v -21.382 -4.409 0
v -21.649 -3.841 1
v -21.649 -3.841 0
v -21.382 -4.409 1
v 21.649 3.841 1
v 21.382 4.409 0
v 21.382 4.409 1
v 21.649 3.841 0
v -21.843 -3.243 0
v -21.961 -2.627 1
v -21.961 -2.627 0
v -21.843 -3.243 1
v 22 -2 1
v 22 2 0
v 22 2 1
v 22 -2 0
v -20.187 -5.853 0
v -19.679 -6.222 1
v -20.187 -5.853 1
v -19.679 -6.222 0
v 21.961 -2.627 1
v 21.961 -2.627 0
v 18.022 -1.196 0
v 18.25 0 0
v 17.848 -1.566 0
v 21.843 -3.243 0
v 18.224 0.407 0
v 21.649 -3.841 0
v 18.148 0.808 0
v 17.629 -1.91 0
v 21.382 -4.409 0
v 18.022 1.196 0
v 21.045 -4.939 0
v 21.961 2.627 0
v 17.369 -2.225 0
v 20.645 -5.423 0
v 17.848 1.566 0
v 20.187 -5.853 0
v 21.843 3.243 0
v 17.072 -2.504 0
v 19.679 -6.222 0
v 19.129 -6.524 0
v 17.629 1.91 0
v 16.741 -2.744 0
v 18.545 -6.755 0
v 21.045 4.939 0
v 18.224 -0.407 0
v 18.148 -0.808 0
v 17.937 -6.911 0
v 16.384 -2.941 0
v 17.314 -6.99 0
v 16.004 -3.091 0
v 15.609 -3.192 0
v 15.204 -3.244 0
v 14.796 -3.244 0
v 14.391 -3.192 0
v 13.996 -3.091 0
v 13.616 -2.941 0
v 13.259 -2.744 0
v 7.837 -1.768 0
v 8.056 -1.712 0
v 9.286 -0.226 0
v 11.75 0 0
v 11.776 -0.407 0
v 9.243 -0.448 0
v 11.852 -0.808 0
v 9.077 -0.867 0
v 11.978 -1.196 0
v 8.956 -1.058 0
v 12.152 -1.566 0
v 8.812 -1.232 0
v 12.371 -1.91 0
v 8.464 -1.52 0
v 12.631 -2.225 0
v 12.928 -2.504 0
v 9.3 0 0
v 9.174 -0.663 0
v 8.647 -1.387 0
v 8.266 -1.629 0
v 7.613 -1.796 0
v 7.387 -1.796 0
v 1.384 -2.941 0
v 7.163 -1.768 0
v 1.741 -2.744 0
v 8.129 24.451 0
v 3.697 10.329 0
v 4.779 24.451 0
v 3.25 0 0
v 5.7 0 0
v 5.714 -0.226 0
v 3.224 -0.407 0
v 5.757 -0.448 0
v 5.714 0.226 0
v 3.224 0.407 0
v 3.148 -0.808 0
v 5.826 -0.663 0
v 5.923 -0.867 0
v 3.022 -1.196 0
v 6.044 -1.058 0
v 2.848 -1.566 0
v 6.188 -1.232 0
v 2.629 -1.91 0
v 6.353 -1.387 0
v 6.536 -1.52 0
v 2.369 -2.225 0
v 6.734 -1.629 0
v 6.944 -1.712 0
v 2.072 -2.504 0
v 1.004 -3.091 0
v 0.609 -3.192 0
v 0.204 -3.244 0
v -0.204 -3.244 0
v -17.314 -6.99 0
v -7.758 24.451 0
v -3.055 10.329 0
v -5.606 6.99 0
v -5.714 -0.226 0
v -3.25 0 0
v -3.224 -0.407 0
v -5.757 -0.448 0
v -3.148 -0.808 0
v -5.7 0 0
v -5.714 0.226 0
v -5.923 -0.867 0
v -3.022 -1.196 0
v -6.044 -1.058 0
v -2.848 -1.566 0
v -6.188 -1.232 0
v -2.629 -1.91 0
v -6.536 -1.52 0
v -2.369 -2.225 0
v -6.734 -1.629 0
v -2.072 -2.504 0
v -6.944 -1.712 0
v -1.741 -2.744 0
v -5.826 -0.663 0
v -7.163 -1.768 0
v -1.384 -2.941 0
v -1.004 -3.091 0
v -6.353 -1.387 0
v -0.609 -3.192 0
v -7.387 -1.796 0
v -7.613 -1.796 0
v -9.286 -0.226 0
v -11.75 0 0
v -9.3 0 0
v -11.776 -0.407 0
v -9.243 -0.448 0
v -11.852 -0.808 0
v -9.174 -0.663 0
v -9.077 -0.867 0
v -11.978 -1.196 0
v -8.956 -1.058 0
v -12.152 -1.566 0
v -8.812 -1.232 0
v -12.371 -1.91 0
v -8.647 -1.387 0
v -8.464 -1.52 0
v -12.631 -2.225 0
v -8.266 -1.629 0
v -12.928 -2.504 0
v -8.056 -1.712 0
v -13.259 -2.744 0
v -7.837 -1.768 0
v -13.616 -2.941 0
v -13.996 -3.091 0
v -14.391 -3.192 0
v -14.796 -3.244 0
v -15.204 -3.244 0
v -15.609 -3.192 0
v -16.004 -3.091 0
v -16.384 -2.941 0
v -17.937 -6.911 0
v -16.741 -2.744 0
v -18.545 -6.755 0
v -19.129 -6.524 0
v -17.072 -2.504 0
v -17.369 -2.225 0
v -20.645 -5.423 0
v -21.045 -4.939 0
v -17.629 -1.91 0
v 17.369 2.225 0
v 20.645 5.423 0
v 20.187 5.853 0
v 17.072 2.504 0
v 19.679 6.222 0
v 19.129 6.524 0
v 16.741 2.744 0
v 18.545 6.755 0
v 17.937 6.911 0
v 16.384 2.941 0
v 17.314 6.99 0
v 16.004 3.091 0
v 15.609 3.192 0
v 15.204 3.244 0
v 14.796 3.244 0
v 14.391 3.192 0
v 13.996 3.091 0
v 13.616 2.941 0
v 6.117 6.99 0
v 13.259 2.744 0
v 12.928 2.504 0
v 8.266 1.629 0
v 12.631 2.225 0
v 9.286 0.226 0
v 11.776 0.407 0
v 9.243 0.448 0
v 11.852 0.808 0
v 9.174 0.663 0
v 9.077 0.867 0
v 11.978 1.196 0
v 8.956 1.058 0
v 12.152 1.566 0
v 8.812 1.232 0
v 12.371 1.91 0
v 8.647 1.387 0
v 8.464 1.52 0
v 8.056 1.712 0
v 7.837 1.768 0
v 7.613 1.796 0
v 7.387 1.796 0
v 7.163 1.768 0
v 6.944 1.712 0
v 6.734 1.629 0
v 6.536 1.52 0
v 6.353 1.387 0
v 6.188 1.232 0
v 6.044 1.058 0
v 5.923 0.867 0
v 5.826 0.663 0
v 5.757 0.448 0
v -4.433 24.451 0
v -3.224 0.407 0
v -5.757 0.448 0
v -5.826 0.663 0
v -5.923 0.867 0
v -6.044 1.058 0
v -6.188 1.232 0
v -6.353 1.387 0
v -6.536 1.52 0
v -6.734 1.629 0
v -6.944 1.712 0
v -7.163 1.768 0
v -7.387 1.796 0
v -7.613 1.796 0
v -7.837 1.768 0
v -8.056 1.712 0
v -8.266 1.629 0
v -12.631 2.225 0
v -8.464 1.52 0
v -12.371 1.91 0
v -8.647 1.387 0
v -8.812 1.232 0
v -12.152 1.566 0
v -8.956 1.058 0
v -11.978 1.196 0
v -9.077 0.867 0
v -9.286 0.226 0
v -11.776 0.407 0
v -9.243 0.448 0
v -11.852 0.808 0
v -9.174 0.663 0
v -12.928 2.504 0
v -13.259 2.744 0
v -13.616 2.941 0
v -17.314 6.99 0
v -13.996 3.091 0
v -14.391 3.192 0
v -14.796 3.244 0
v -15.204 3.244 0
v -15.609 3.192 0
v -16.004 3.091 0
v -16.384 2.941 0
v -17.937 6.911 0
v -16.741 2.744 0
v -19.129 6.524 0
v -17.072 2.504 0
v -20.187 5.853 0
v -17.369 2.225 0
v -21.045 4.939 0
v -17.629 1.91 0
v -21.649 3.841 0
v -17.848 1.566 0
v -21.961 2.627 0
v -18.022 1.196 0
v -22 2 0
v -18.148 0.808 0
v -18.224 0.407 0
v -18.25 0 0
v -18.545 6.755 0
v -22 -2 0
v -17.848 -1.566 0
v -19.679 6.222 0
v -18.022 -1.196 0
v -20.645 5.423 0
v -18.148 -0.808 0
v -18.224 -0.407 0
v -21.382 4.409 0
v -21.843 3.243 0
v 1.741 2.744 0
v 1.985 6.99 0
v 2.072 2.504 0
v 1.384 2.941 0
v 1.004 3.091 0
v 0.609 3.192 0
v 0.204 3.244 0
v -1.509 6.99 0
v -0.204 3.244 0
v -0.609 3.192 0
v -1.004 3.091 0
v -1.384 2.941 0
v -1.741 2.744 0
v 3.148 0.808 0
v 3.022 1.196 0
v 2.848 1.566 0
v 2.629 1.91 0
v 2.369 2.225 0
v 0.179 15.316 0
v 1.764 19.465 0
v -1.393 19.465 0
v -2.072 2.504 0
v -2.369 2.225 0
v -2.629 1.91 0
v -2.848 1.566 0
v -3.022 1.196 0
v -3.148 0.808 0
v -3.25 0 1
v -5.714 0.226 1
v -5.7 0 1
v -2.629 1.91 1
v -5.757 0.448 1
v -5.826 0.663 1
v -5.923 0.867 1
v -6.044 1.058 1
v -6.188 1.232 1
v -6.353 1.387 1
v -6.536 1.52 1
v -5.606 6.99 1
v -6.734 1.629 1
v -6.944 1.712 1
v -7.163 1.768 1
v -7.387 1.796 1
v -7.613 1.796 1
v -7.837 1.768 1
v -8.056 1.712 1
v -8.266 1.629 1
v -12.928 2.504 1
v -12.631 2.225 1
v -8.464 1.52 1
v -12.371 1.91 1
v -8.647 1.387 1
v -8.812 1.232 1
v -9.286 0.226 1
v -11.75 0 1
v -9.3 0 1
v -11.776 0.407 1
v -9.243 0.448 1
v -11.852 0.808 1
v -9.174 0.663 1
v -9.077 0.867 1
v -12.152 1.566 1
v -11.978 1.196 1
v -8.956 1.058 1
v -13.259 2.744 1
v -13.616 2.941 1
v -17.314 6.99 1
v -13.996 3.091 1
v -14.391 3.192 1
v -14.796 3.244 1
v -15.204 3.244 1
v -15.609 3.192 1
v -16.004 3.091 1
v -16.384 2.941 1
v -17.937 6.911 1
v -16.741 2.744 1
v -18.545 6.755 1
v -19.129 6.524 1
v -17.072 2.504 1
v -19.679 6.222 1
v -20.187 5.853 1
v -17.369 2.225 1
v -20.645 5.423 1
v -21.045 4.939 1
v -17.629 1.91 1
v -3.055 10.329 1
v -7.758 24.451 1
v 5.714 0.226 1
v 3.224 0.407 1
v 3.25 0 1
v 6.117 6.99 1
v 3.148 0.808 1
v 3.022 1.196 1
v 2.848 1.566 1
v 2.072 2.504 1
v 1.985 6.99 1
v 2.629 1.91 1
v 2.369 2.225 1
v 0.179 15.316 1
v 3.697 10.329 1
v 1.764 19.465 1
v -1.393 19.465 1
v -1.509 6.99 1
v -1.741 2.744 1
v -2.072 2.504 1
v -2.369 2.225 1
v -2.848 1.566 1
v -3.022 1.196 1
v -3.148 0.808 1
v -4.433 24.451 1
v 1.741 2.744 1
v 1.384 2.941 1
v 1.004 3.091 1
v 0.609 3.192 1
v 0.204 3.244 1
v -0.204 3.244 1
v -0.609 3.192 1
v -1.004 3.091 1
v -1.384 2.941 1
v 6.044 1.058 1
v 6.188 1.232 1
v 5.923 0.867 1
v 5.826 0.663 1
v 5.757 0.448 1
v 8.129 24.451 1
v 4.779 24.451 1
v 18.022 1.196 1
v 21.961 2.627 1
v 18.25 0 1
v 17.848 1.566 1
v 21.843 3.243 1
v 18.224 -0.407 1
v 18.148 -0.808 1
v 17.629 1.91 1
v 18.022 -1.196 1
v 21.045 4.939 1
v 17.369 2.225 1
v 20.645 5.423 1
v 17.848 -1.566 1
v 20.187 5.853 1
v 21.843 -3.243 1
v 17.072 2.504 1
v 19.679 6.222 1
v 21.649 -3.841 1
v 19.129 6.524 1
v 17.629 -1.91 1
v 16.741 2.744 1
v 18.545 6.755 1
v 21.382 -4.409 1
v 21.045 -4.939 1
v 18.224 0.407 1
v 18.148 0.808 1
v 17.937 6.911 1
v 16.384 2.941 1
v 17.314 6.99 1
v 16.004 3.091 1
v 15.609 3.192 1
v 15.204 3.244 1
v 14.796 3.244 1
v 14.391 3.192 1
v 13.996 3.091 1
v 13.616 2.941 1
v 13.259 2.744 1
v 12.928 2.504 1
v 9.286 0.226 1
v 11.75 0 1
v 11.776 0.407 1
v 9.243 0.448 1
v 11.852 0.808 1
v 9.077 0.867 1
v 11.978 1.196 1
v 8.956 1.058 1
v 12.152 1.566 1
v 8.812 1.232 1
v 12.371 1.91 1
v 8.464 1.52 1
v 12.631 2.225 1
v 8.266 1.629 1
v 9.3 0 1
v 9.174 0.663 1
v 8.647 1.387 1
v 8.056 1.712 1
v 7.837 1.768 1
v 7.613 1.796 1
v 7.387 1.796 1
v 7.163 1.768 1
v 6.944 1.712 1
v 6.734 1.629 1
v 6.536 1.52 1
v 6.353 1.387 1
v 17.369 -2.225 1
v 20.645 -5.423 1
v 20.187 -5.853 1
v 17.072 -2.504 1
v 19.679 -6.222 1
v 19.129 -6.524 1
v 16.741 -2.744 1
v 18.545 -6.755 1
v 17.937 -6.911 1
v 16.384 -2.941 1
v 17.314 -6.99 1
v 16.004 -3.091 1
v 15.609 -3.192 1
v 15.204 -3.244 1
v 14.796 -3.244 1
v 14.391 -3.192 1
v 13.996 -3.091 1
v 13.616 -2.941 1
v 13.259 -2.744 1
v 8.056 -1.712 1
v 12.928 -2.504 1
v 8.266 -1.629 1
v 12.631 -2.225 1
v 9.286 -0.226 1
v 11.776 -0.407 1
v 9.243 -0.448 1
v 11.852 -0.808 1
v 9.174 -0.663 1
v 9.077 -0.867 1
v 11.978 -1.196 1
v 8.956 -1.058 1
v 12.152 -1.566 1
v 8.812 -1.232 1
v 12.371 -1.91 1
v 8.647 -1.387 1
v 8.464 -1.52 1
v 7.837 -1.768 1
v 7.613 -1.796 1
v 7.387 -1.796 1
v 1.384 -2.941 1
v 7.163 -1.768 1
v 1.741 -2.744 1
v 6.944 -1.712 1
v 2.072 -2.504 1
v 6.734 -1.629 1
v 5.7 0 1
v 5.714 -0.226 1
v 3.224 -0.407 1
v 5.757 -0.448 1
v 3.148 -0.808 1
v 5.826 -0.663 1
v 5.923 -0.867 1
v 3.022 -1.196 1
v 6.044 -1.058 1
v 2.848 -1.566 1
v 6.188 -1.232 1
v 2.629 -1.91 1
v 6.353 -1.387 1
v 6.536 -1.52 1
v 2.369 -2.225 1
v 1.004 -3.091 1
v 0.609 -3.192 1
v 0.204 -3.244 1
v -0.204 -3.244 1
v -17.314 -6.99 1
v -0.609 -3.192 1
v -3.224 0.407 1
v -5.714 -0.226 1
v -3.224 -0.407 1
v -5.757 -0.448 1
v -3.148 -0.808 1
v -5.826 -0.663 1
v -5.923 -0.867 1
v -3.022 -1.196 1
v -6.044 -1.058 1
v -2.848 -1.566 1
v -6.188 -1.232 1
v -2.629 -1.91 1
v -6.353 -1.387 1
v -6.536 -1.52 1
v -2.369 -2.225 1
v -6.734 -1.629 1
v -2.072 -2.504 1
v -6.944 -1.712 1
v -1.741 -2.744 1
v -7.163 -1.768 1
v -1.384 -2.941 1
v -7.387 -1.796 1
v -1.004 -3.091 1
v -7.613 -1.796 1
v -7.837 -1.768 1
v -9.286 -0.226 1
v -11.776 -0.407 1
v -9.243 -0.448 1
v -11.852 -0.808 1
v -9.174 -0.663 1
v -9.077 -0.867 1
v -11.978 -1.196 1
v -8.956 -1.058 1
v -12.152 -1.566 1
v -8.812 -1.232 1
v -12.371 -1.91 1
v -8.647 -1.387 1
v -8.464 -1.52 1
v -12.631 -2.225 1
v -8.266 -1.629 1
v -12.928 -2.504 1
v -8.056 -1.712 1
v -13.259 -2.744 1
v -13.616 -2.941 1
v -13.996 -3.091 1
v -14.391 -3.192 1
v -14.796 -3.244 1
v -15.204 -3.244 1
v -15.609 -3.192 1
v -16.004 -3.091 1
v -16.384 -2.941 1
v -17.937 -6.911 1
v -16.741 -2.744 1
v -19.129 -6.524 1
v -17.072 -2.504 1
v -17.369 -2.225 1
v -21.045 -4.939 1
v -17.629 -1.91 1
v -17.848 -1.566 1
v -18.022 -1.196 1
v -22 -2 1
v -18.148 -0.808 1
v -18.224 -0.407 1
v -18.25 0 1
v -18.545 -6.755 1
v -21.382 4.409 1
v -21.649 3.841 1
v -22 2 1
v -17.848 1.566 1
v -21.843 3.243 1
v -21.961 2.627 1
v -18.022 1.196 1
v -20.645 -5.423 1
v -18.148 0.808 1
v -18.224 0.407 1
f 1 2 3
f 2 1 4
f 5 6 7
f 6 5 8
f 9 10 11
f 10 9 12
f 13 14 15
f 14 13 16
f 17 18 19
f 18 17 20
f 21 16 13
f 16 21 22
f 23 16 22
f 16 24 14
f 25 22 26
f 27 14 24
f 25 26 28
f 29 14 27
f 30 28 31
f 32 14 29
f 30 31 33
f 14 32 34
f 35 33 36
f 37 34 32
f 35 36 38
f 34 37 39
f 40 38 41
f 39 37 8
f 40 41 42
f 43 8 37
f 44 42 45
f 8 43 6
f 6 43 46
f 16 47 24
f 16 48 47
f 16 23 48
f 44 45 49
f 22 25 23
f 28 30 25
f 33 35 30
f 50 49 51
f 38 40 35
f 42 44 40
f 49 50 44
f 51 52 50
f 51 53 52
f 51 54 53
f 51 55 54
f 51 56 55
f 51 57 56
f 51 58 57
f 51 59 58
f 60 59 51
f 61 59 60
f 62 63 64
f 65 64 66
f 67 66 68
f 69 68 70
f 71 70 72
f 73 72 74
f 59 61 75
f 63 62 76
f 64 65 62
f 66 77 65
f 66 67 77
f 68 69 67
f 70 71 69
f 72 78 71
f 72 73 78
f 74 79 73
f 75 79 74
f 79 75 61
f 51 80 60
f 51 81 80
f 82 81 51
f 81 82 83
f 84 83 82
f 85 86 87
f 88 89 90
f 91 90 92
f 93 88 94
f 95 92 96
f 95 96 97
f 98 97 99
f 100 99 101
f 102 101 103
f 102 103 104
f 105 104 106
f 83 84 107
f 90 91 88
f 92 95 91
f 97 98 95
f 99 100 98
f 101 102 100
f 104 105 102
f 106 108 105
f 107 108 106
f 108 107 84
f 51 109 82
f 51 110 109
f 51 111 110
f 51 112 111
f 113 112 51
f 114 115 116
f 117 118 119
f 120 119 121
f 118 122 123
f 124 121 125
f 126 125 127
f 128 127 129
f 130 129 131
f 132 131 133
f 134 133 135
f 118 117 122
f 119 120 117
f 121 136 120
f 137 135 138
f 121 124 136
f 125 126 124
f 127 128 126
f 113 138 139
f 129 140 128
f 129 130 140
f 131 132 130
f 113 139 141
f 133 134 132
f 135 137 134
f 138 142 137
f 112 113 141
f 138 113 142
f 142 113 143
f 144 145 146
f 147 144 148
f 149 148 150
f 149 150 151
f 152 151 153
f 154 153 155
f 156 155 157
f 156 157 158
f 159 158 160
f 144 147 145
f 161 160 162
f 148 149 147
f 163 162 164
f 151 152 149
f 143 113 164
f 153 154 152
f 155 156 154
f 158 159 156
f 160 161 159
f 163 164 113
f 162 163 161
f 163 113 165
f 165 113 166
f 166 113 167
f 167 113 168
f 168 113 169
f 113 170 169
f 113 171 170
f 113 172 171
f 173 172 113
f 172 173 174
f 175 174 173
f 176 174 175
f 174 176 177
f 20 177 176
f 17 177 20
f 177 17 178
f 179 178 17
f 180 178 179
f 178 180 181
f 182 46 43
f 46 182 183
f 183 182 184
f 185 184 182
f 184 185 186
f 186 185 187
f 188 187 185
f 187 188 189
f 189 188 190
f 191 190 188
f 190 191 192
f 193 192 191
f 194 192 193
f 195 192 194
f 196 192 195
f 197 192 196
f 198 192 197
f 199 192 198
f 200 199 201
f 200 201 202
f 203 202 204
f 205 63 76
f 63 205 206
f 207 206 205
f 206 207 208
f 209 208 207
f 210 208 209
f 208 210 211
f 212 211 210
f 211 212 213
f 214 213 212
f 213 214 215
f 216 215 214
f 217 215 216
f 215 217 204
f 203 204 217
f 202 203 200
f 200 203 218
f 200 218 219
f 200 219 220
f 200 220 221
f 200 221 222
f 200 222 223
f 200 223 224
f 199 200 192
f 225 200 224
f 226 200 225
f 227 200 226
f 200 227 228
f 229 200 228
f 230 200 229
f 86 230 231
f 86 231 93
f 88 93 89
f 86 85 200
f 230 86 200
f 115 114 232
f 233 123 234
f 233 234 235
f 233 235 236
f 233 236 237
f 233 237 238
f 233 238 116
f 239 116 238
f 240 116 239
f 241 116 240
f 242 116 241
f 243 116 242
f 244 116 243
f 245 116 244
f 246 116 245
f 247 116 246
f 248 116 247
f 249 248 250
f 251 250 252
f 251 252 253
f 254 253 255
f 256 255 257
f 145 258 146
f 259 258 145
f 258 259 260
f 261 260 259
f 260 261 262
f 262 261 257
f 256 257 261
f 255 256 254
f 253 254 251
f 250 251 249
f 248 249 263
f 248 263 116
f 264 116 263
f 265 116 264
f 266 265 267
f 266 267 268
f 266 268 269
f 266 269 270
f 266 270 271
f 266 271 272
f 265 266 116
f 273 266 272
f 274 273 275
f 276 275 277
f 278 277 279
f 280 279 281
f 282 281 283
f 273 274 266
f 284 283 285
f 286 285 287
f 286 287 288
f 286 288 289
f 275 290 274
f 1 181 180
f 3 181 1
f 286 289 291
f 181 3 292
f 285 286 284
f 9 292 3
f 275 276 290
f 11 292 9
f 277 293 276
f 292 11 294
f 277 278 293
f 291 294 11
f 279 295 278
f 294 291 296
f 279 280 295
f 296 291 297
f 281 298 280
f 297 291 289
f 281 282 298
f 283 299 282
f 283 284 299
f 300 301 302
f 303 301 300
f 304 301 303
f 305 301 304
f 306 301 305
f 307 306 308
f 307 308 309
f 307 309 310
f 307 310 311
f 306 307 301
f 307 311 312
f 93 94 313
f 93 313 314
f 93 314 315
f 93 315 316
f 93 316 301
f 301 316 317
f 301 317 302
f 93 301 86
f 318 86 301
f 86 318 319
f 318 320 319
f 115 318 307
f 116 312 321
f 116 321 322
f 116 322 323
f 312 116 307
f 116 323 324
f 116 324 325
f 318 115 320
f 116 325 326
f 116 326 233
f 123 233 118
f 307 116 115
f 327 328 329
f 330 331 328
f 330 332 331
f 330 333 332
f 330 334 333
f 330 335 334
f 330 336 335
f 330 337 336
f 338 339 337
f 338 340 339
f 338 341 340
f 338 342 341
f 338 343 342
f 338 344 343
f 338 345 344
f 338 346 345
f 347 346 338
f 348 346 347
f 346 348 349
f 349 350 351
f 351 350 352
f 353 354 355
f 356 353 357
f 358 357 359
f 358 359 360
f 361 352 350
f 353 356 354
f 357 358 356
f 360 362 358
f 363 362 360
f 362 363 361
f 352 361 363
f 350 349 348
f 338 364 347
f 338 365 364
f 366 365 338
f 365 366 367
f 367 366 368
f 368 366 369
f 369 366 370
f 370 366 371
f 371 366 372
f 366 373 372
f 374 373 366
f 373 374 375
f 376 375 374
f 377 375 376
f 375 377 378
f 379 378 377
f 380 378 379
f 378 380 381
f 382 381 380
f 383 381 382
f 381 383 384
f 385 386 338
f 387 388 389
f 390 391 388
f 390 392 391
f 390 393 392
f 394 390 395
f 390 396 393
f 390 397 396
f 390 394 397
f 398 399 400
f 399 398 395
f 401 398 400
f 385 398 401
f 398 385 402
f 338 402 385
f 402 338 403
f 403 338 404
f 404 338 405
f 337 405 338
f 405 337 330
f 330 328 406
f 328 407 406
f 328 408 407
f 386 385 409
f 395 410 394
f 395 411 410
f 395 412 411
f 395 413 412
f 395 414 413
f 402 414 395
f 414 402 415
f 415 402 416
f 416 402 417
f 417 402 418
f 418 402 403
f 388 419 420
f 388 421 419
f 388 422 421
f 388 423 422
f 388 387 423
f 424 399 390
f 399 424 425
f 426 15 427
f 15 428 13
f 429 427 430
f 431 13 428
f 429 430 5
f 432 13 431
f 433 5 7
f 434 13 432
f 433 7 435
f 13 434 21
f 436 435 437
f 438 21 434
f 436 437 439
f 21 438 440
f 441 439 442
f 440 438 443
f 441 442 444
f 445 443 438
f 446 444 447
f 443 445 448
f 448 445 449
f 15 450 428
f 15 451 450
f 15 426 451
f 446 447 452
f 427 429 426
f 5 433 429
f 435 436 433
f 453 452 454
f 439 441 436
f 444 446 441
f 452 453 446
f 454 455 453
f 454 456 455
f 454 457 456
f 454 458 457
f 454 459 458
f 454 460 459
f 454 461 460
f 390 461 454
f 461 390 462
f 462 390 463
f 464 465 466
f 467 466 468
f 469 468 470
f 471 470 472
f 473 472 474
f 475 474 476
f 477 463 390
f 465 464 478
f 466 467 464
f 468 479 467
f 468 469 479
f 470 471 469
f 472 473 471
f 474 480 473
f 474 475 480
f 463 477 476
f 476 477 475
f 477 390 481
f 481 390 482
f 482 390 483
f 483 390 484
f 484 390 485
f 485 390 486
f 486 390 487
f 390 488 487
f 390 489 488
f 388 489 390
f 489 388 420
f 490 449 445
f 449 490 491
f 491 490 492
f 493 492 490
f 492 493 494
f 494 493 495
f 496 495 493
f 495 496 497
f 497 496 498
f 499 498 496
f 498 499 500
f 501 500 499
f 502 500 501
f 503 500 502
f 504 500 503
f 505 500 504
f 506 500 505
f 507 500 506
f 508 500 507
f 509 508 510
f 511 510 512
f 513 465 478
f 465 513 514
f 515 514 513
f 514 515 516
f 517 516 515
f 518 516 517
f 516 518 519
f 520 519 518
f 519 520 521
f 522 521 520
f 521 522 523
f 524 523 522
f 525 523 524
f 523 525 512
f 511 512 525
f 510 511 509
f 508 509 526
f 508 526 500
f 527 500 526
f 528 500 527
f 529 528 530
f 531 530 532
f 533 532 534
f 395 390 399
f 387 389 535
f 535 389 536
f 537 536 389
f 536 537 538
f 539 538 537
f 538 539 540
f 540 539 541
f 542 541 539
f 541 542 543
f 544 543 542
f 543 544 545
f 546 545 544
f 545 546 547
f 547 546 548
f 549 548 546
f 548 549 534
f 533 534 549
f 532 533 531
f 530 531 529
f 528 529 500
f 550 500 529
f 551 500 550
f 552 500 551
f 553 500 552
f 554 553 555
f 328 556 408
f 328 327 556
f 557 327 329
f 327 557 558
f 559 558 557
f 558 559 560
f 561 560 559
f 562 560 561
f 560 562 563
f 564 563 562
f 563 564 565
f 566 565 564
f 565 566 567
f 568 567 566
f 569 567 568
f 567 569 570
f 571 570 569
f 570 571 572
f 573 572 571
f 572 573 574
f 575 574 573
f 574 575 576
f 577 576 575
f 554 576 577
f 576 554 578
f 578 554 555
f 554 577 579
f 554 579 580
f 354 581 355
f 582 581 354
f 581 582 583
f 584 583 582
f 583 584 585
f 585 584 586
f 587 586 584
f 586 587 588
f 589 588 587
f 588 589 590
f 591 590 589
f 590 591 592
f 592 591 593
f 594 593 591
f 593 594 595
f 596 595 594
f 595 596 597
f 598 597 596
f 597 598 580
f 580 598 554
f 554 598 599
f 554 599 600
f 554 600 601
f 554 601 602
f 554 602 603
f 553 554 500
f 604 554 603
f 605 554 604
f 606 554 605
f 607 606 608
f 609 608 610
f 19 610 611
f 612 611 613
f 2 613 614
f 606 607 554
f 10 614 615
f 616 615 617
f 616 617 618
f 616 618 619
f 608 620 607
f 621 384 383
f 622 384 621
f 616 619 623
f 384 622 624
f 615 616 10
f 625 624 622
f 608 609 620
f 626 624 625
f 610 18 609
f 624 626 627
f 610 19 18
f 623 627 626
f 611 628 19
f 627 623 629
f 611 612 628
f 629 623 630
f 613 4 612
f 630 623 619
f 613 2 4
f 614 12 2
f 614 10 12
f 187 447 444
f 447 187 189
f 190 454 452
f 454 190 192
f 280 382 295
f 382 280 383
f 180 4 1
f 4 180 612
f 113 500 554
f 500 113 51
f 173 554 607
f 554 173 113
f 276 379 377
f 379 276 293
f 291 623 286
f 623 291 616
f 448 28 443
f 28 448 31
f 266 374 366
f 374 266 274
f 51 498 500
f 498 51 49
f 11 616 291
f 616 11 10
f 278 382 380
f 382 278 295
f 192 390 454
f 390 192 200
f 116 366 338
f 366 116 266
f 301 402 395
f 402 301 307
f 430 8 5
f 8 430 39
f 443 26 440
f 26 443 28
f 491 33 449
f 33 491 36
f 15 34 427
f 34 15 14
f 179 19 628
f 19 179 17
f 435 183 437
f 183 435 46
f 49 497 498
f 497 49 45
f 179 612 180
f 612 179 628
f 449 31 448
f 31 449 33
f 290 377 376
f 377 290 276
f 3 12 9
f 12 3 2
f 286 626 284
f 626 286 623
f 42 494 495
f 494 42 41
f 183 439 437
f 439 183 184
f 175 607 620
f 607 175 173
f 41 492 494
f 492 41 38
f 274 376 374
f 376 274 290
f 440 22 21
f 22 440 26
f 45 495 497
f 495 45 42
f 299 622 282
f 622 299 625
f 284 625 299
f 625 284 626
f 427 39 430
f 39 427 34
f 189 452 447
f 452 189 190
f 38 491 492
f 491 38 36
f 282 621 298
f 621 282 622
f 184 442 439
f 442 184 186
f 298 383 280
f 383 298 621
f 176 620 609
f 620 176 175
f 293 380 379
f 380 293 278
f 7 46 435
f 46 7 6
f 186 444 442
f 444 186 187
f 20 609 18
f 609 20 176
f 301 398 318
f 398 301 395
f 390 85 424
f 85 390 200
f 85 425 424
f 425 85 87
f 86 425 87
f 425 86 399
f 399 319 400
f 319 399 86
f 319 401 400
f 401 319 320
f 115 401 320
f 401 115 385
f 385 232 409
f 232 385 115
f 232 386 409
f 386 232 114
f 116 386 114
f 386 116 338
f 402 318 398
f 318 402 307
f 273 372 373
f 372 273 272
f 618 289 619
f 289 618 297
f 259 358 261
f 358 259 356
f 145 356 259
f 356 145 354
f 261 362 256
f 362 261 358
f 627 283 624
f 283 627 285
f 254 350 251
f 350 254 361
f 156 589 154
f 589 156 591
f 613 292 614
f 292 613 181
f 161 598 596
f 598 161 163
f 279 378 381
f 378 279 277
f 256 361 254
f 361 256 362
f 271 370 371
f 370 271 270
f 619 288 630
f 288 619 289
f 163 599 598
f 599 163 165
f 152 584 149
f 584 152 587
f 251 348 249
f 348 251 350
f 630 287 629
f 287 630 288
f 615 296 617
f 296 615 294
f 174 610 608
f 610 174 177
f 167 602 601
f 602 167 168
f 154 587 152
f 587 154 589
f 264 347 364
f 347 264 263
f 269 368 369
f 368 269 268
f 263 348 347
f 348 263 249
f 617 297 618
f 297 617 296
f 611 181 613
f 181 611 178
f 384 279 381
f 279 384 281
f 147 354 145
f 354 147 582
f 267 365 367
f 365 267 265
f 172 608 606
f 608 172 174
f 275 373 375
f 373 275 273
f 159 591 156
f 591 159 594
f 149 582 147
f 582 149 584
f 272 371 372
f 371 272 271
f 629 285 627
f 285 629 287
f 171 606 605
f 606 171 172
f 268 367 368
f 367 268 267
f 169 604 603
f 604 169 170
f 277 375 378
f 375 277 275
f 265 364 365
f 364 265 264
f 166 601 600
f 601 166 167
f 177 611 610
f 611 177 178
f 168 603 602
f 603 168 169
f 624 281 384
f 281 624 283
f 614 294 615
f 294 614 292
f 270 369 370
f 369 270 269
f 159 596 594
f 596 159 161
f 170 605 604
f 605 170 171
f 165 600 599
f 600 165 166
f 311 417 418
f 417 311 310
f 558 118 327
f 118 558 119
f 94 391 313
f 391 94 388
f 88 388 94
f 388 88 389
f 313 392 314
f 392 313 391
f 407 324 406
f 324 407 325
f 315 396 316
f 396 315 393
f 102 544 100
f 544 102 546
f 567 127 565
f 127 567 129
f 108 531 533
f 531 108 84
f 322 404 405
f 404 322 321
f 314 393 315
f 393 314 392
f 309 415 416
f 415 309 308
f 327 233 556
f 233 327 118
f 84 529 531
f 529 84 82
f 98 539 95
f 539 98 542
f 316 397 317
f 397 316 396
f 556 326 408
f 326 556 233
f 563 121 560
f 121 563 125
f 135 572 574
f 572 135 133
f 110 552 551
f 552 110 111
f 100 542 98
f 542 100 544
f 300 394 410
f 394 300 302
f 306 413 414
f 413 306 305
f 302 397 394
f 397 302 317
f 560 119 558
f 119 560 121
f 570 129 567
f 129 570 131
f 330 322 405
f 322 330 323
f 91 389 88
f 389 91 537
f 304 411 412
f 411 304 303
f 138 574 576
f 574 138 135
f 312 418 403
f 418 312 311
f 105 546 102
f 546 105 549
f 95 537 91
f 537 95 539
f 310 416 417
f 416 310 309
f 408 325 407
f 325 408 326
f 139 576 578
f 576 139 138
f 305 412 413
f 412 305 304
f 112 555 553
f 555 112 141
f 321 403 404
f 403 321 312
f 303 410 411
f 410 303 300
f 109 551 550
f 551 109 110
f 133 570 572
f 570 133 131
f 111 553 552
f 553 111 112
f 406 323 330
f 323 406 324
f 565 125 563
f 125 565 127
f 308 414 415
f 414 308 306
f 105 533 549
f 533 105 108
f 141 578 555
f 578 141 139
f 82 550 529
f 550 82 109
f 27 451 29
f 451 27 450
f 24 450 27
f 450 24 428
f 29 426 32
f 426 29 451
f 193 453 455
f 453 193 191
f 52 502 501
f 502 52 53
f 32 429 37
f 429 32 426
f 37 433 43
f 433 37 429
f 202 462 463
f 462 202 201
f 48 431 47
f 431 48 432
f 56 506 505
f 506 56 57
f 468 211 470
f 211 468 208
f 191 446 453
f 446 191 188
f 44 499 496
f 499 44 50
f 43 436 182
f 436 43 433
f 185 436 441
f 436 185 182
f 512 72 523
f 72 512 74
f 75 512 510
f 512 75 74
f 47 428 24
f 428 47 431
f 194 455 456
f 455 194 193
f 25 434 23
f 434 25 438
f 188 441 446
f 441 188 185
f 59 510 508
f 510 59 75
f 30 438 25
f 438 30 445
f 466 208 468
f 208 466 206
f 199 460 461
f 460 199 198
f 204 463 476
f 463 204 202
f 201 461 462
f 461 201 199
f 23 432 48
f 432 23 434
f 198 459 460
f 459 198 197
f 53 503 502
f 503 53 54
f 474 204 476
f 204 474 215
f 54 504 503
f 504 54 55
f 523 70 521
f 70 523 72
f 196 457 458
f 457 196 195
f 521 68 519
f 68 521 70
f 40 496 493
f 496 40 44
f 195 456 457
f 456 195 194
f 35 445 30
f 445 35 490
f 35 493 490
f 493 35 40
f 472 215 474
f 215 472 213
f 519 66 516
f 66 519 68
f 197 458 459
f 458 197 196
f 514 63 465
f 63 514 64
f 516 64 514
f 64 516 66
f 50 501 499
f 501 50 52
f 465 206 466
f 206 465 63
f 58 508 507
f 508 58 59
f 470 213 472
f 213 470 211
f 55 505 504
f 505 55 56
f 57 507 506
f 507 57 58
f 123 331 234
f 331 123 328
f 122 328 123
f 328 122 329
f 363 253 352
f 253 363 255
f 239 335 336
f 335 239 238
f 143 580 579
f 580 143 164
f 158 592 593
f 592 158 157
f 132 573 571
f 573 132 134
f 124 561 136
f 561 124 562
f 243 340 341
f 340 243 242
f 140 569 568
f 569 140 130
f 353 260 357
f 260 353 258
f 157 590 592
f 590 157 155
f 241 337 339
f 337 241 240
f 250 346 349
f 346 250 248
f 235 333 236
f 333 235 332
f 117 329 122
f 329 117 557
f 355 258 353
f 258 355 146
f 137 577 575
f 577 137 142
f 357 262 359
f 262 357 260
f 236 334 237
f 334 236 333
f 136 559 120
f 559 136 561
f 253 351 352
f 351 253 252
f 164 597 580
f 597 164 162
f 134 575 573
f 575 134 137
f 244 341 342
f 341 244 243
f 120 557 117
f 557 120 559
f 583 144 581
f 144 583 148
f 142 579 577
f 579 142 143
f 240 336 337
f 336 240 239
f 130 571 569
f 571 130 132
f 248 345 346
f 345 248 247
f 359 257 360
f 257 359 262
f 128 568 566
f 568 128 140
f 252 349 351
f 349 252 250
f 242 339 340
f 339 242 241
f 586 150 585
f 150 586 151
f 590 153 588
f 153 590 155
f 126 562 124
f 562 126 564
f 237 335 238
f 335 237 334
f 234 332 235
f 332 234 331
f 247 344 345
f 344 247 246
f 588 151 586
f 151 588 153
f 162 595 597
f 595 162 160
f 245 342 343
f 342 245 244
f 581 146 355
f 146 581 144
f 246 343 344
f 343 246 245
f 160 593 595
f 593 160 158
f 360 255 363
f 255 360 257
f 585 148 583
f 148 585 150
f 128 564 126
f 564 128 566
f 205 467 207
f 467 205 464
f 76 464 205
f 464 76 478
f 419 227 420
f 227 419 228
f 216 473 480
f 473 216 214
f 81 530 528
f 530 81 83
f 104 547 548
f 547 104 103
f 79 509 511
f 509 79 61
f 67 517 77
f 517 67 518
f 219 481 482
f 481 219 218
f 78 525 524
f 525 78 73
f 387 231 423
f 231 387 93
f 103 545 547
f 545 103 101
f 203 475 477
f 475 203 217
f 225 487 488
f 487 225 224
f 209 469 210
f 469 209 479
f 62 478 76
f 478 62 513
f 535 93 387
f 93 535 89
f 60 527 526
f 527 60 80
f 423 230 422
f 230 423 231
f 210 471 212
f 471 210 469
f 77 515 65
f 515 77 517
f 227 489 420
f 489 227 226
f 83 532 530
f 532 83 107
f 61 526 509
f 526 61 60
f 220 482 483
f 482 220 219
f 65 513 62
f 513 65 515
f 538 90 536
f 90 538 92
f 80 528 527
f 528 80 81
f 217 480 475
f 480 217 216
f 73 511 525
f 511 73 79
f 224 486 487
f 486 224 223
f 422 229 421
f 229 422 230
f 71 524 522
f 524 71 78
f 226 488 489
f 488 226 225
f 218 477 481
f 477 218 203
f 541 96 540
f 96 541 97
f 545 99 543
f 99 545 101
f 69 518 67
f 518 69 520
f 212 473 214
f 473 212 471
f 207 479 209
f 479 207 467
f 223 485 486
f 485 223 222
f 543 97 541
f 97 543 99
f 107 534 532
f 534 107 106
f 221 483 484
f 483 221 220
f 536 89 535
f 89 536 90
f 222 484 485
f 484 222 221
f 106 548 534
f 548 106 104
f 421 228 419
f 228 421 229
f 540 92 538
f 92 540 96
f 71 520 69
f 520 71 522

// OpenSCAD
$fn = 50;


difference() {
	union() {
		hull() {
			translate(v = [-17.0000000000, 2.0000000000, 0]) {
				cylinder(h = 1, r = 5);
			}
			translate(v = [17.0000000000, 2.0000000000, 0]) {
				cylinder(h = 1, r = 5);
			}
			translate(v = [-17.0000000000, -2.0000000000, 0]) {
				cylinder(h = 1, r = 5);
			}
			translate(v = [17.0000000000, -2.0000000000, 0]) {
				cylinder(h = 1, r = 5);
			}
		}
		translate(v = [0, 24, 0]) {
			linear_extrude(height = 1) {
				text(font = "DejaVu Sans Mono:style=Bold", halign = "center", size = 19.0000000000, text = "W", valign = "top");
			}
		}
	}
	union() {
		translate(v = [-15.0000000000, 0.0000000000, 0]) {
			translate(v = [0, 0, -100]) {
				cylinder(h = 200, r = 3.2500000000);
			}
		}
		translate(v = [0, 0, -100]) {
			cylinder(h = 200, r = 3.2500000000);
		}
		translate(v = [15.0000000000, 0.0000000000, 0]) {
			translate(v = [0, 0, -100]) {
				cylinder(h = 200, r = 3.2500000000);
			}
		}
		translate(v = [-15.0000000000, 0.0000000000, 0]) {
			translate(v = [0, 0, -100]) {
				cylinder(h = 200, r = 1.8000000000);
			}
		}
		translate(v = [-7.5000000000, 0.0000000000, 0]) {
			translate(v = [0, 0, -100]) {
				cylinder(h = 200, r = 1.8000000000);
			}
		}
		translate(v = [0, 0, -100]) {
			cylinder(h = 200, r = 1.8000000000);
		}
		translate(v = [7.5000000000, 0.0000000000, 0]) {
			translate(v = [0, 0, -100]) {
				cylinder(h = 200, r = 1.8000000000);
			}
		}
		translate(v = [15.0000000000, 0.0000000000, 0]) {
			translate(v = [0, 0, -100]) {
				cylinder(h = 200, r = 1.8000000000);
			}
		}
	}
}
